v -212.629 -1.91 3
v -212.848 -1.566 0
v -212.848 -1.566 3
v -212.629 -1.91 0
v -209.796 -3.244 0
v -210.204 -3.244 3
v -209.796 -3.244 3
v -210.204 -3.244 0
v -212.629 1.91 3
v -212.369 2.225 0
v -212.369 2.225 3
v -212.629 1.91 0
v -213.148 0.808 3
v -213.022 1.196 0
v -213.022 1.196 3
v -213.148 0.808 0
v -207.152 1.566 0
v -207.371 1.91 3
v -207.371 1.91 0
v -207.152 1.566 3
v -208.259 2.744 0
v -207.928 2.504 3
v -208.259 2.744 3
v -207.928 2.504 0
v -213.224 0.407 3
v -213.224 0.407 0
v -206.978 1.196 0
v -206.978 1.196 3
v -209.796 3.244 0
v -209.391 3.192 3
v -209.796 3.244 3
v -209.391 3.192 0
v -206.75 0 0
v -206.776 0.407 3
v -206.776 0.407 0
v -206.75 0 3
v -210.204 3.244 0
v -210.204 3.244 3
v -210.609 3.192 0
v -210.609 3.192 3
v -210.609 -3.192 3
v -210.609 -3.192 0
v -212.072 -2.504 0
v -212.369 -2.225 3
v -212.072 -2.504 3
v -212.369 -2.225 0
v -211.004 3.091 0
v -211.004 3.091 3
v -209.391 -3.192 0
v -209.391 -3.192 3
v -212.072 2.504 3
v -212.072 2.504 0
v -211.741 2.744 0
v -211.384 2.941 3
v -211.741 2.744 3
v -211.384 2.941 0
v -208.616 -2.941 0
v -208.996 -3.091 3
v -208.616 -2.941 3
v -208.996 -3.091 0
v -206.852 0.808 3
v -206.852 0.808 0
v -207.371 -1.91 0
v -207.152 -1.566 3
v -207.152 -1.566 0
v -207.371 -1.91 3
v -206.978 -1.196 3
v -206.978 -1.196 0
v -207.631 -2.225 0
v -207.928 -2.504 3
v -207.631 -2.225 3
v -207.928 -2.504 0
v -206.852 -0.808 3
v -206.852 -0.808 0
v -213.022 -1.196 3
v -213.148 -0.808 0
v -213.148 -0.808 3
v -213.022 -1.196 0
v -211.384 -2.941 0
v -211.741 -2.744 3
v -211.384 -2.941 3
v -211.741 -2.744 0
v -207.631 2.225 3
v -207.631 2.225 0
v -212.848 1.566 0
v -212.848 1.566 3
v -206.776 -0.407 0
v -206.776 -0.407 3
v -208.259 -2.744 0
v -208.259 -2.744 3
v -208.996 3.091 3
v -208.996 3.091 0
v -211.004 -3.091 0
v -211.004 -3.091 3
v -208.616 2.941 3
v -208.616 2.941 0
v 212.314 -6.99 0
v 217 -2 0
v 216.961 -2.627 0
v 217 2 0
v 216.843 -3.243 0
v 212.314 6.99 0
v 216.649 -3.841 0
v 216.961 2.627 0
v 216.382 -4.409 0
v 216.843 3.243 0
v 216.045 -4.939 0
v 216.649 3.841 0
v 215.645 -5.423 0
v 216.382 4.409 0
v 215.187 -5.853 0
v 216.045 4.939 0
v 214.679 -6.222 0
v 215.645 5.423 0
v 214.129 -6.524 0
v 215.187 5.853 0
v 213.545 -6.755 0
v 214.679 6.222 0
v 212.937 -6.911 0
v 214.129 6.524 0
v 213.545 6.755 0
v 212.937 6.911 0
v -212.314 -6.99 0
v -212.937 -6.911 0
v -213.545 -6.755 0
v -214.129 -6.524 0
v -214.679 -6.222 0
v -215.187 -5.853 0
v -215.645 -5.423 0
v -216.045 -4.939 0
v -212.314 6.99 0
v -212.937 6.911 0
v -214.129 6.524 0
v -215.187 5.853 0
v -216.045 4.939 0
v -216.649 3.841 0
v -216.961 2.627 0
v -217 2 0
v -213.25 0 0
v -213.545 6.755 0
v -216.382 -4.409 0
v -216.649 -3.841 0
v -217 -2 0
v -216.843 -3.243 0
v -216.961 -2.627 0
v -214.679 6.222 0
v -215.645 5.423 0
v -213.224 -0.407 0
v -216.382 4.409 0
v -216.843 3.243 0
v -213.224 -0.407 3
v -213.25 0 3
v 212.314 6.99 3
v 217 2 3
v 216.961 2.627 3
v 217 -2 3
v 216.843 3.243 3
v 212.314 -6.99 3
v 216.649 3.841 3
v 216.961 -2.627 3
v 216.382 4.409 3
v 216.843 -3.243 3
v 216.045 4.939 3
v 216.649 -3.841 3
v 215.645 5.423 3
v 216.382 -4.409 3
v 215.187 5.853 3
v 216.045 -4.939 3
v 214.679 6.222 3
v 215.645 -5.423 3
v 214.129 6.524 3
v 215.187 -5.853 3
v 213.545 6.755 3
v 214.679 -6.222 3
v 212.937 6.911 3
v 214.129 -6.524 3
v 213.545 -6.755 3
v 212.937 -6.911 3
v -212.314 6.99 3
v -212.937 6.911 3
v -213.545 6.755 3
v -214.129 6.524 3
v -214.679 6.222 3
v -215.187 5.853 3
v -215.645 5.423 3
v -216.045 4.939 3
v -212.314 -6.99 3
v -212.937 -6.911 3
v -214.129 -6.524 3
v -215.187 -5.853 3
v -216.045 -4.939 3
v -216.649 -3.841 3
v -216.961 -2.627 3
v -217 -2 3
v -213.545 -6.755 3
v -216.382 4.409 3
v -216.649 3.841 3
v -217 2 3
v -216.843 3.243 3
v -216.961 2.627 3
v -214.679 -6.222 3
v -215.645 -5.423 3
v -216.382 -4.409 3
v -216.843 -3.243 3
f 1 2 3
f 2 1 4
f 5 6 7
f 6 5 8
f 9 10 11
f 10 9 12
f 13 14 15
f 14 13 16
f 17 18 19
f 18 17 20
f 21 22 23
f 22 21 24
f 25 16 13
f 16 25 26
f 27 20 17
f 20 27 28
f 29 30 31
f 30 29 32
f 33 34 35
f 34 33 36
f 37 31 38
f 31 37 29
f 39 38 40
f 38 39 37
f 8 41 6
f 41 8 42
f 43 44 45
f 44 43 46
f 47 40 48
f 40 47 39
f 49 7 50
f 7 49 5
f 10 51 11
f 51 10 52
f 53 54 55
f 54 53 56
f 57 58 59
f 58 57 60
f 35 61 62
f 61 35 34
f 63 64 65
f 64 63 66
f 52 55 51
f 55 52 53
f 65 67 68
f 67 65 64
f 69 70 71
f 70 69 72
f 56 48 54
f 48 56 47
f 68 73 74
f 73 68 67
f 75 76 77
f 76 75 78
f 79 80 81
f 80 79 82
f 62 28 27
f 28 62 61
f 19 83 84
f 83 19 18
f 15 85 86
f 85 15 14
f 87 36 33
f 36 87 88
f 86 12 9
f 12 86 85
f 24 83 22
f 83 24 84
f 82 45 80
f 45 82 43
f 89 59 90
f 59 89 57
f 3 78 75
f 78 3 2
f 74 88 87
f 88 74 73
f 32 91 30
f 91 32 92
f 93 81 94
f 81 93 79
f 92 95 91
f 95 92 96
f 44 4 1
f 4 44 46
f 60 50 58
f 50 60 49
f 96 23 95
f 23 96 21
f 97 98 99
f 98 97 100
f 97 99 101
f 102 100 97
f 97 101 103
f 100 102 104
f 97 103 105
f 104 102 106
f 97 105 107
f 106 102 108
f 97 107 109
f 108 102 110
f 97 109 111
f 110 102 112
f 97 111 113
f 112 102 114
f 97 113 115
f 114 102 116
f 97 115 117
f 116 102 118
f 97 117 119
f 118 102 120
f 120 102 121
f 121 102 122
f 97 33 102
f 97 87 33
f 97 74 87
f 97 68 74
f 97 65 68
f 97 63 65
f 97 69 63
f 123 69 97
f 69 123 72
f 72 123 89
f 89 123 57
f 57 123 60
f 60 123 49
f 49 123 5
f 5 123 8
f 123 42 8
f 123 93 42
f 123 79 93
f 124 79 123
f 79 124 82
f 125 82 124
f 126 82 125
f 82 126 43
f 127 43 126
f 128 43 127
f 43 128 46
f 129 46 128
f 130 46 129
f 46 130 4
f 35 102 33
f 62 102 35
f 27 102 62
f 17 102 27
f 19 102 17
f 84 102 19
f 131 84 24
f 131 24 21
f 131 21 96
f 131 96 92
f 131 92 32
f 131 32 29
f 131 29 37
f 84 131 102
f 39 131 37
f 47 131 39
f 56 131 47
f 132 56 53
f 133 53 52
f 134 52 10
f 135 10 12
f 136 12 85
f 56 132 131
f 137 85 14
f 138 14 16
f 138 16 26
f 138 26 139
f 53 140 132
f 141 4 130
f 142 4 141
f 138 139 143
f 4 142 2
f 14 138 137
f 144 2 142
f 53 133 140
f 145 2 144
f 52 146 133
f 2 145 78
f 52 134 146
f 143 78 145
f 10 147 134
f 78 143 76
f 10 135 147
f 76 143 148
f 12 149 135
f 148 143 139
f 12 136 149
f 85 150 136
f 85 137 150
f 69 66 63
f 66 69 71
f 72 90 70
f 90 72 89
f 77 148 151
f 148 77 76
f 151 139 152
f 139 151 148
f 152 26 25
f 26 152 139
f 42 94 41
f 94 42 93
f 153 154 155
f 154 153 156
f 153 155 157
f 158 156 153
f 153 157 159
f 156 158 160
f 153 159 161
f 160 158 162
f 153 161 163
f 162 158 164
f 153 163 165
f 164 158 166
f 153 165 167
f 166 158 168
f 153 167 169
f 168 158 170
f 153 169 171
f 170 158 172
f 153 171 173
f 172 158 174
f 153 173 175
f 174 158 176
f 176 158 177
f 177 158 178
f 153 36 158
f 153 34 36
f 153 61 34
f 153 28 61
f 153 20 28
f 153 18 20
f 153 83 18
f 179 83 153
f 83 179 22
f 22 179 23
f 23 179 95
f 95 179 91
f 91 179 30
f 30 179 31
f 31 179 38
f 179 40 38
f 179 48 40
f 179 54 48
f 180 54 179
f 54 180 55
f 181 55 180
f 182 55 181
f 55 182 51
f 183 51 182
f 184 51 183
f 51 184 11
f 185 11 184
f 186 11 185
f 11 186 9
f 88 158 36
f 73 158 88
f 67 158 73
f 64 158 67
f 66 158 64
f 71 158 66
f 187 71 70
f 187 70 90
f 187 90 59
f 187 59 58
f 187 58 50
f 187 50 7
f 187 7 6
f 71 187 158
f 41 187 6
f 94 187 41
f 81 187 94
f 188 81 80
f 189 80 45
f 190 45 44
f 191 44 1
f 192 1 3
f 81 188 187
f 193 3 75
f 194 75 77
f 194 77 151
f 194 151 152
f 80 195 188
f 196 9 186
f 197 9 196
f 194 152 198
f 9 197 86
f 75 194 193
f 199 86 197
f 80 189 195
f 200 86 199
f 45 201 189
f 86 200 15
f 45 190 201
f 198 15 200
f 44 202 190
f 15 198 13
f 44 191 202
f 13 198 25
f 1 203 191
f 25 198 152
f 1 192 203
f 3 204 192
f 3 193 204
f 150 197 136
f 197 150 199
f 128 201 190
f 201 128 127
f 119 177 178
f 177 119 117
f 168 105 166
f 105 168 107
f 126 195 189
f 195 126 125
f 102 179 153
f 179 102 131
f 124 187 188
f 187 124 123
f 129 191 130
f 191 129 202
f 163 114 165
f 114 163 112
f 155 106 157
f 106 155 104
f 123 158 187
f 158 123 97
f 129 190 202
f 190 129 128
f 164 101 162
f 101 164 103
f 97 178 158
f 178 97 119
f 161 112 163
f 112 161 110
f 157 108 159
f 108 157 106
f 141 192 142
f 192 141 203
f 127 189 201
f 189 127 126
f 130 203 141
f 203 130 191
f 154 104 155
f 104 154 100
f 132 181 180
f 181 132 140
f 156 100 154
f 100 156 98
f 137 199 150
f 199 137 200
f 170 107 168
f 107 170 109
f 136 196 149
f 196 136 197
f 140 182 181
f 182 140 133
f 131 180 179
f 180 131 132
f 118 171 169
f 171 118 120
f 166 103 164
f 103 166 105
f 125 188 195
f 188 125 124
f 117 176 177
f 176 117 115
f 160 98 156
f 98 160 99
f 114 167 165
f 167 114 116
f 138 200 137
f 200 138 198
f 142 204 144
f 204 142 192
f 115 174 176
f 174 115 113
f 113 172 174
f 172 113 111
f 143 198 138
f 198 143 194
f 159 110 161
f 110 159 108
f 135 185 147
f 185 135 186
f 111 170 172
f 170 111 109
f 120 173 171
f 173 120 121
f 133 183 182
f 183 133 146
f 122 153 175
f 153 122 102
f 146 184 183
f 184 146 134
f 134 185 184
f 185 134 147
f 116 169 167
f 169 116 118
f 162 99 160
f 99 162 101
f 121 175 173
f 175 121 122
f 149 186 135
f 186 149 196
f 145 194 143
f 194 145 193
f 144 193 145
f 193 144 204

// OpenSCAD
$fn = 50;


difference() {
	union() {
		hull() {
			translate(v = [-212.0000000000, 2.0000000000, 0]) {
				cylinder(h = 3, r = 5);
			}
			translate(v = [212.0000000000, 2.0000000000, 0]) {
				cylinder(h = 3, r = 5);
			}
			translate(v = [-212.0000000000, -2.0000000000, 0]) {
				cylinder(h = 3, r = 5);
			}
			translate(v = [212.0000000000, -2.0000000000, 0]) {
				cylinder(h = 3, r = 5);
			}
		}
	}
	union() {
		translate(v = [-210.0000000000, 0.0000000000, 0]) {
			cylinder(h = 3, r = 3.2500000000);
		}
		translate(v = [-210.0000000000, 0.0000000000, 0]) {
			cylinder(h = 3, r = 1.8000000000);
		}
		translate(v = [-210.0000000000, 0.0000000000, 0]) {
			cylinder(h = 3, r = 1.8000000000);
		}
		translate(v = [-210.0000000000, 0.0000000000, 0]) {
			cylinder(h = 3, r = 1.8000000000);
		}
	}
}
